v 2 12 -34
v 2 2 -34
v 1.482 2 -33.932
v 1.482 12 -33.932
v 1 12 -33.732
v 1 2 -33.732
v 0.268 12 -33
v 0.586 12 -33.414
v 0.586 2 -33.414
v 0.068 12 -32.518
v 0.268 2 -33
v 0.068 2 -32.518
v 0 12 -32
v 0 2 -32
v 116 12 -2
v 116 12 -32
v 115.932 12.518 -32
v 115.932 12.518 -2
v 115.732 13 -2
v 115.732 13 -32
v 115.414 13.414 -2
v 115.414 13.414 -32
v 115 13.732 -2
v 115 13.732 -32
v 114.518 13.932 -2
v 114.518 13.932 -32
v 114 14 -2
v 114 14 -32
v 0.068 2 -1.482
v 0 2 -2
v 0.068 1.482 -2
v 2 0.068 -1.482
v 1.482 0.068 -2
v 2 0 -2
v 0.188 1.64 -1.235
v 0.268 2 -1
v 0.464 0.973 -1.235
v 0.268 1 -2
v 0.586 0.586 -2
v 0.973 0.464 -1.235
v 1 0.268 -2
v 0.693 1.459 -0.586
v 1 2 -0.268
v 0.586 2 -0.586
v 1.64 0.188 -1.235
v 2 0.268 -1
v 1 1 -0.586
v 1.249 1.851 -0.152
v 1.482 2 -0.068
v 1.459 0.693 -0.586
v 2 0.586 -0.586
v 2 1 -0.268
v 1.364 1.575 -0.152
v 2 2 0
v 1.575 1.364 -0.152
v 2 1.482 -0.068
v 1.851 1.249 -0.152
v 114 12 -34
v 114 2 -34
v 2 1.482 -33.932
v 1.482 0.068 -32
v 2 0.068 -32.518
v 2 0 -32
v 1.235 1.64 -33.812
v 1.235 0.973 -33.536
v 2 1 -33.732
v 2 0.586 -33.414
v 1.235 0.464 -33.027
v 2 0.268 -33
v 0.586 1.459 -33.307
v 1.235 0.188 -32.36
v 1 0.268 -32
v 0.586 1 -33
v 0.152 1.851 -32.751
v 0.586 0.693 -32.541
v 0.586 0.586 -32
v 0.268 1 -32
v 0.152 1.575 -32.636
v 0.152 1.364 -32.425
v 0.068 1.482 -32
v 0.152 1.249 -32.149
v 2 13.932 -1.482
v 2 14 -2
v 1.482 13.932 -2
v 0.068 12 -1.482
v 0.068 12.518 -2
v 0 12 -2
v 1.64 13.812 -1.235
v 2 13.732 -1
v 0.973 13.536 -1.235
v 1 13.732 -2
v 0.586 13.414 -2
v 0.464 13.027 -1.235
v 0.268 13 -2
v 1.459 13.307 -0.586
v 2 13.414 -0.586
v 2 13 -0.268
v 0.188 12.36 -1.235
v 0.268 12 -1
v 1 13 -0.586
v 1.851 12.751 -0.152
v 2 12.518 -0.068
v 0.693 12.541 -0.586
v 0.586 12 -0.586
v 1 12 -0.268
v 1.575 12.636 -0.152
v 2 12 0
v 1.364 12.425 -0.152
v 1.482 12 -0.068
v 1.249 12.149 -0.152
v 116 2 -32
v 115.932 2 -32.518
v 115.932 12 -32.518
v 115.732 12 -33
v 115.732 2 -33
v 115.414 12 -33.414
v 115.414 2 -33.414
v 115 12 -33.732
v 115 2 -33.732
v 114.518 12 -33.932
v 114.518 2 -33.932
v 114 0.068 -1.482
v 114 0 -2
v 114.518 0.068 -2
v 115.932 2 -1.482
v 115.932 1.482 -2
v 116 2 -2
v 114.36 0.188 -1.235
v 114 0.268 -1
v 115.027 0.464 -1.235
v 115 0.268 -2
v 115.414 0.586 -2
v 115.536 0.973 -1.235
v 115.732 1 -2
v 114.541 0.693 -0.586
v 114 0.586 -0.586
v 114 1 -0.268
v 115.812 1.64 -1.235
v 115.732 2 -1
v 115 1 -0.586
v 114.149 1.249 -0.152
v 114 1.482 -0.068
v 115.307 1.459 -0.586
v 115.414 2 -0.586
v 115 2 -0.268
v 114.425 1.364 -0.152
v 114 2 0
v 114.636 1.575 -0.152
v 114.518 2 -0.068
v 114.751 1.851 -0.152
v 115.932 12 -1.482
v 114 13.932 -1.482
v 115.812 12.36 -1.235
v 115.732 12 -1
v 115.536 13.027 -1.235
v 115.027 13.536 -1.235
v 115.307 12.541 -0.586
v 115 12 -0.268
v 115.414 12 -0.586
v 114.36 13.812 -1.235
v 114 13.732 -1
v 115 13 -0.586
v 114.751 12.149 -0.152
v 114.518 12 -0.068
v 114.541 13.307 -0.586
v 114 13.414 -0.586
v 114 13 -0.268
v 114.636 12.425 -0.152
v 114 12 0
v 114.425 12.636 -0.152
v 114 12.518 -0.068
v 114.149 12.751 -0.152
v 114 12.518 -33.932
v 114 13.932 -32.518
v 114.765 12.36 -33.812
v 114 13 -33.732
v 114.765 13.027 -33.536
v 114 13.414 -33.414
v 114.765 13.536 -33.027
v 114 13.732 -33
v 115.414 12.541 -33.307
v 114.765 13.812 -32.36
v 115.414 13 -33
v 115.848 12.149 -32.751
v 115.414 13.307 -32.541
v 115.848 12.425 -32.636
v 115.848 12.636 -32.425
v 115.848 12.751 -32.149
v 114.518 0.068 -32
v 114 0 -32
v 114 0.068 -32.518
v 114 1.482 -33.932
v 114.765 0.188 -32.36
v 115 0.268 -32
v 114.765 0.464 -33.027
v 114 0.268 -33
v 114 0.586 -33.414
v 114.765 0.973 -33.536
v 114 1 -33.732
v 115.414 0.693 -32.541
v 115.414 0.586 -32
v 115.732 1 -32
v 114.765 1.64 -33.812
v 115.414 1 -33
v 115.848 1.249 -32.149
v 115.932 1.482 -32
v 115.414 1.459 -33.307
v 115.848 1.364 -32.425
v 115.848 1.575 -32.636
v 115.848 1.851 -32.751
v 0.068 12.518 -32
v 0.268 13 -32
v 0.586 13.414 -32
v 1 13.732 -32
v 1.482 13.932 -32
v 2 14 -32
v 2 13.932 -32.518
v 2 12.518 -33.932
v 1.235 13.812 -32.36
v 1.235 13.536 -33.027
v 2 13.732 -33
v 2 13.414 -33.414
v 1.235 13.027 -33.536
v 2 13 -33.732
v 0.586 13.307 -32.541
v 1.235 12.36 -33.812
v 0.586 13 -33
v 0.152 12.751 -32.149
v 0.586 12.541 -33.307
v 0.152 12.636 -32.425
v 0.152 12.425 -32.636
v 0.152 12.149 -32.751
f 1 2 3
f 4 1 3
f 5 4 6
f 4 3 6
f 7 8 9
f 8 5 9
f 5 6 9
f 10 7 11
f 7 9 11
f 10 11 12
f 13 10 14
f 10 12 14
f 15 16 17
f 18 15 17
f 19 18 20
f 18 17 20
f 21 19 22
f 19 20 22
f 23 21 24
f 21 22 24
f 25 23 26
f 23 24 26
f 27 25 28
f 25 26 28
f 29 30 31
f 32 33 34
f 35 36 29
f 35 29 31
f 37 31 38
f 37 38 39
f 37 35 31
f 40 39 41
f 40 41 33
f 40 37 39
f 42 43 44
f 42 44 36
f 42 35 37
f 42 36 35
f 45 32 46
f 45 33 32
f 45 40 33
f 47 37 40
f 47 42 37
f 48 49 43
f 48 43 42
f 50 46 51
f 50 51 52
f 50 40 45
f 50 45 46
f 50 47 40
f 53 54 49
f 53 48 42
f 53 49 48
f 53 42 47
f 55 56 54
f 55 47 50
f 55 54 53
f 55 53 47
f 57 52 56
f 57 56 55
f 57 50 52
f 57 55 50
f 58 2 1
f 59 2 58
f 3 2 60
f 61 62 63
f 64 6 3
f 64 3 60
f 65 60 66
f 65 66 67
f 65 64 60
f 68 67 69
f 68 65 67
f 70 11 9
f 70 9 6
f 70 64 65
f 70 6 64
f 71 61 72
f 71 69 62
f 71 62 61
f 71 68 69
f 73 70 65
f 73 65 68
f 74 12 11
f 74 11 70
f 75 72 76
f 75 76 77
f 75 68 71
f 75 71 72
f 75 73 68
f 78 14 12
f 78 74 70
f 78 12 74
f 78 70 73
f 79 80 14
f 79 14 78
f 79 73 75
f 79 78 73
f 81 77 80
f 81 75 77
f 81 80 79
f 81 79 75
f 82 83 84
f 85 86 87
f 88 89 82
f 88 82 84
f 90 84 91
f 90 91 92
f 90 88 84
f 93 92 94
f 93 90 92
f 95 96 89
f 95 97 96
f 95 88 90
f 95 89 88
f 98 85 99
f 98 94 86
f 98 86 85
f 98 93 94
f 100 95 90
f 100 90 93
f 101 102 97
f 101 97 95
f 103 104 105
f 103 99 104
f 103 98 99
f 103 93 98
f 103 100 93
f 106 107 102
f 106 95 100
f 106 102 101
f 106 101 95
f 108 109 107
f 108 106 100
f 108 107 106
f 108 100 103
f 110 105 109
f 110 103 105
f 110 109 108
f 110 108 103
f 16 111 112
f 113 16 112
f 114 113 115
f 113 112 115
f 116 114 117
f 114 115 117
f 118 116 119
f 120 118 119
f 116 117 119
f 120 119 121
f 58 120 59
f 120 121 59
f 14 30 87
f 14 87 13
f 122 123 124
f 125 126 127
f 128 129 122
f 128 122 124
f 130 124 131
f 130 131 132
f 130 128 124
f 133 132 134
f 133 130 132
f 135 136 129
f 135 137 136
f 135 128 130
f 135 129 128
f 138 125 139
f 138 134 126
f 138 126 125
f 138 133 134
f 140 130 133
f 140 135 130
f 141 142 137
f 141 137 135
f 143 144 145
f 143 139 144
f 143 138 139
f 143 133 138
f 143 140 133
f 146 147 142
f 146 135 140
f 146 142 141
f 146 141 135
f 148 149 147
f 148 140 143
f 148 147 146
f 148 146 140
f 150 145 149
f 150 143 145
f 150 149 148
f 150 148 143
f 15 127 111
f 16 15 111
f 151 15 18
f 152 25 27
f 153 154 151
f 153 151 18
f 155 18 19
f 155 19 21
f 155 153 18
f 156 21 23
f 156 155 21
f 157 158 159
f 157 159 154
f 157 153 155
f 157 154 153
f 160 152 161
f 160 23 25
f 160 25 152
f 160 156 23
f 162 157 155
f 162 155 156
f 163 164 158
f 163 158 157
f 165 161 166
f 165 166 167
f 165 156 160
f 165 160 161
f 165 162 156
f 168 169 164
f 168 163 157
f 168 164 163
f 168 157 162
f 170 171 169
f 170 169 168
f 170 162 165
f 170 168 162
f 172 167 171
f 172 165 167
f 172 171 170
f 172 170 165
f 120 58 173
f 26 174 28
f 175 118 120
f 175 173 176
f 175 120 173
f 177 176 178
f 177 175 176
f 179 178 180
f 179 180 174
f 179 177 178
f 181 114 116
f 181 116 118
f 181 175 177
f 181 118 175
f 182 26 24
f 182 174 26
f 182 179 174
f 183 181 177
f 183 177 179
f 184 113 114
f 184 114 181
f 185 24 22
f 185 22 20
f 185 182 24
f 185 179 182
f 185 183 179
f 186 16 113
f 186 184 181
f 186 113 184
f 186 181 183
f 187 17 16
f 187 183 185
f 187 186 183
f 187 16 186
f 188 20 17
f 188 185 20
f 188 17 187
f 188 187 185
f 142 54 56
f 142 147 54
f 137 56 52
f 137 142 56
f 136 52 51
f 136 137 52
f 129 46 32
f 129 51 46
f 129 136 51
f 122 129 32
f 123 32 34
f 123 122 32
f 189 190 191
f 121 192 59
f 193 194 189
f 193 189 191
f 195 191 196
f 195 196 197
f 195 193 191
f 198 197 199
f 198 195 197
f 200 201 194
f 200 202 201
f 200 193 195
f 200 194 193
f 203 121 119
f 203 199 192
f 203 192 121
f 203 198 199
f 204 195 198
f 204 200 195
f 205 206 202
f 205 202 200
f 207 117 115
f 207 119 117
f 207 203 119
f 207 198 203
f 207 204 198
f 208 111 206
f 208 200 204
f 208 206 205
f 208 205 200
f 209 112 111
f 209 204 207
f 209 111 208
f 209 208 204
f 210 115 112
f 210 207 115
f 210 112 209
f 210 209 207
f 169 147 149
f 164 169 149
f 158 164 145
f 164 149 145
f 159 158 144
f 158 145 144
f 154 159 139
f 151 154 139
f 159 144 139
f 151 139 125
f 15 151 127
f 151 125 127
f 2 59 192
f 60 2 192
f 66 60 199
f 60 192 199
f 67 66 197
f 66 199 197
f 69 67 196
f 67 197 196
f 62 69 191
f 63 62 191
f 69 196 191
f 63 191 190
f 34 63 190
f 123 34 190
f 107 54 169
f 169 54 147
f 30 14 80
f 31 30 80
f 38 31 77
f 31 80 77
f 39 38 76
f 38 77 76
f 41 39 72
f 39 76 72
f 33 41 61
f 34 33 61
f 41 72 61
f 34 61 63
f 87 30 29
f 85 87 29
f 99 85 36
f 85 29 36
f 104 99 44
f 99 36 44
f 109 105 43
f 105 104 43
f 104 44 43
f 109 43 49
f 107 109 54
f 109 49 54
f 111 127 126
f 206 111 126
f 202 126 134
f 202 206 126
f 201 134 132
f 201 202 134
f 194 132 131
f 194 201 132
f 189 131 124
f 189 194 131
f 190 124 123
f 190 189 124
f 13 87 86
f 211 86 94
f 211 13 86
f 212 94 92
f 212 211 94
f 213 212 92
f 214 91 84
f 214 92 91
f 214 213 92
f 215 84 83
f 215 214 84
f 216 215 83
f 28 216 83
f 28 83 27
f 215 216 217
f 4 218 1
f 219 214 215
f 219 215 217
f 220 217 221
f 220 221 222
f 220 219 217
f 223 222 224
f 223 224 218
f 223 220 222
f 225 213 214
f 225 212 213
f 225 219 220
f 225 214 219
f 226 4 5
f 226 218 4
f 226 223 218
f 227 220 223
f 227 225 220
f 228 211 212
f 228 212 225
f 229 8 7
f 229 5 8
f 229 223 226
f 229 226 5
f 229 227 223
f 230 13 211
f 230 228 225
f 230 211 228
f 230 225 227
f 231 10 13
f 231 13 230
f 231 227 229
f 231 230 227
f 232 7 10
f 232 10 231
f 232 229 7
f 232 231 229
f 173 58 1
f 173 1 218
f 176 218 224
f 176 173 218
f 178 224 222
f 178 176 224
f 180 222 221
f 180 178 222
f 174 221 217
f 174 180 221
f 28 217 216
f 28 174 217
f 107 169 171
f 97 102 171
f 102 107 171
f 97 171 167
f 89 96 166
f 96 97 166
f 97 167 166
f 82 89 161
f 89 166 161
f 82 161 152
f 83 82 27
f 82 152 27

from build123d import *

# Parameters (mm, degrees)
ESBO_O1_W                = 116
ESBO_O1_H                = 34
RESSALTO_EXTRUS_O1_DEPTH = 14
FILETE1_R                = 2
FILETE2_R                = 2


with BuildPart() as part:
    # Esboço1 → Ressalto-extrusão1 (new body)
    with BuildSketch(Plane(origin=(0, 0, 0), x_dir=(1, 0, 0), z_dir=(0, 1, 0))):
        with Locations((58, 17)):
            Rectangle(ESBO_O1_W, ESBO_O1_H)
    extrude(amount=RESSALTO_EXTRUS_O1_DEPTH)

    # Filete1
    filete1_edges = [part.edges().sort_by_distance(p)[0] for p in [
        (116, 14, -17),
        (58, 14, -34),
        (0, 14, -17),
        (58, 0, -34),
        (116, 0, -17),
        (58, 0, 0),
        (0, 0, -17),
        (58, 14, 0),
    ]]
    fillet(filete1_edges, radius=FILETE1_R)

    # Filete2
    # the kernel refuses this fillet: 2 mm, written as the material it takes off along each edge
    with BuildSketch(Plane(origin=(2, 2, -32), x_dir=(0, 0, -1), z_dir=(-1, 0, 0))) as filete2_piece_1_section:
        Polygon((0, 0), (FILETE2_R, 0), (FILETE2_R, FILETE2_R), (0, FILETE2_R), align=None)
    filete2_piece_1 = extrude(amount=FILETE2_R, mode=Mode.PRIVATE)
    filete2_piece_1 = filete2_piece_1 - Plane(origin=(2, 2, -32), x_dir=(0, 0.7071067811865475, 0.7071067811865475), z_dir=(-1, 0, 0)) * Sphere(FILETE2_R, mode=Mode.PRIVATE)
    add(filete2_piece_1, mode=Mode.SUBTRACT)
    with BuildSketch(Plane(origin=(114, 2, -32), x_dir=(0, 0, -1), z_dir=(1, 0, 0))) as filete2_piece_2_section:
        Polygon((0, 0), (FILETE2_R, 0), (FILETE2_R, -FILETE2_R), (0, -FILETE2_R), align=None)
    filete2_piece_2 = extrude(amount=FILETE2_R, mode=Mode.PRIVATE)
    filete2_piece_2 = filete2_piece_2 - Plane(origin=(114, 2, -32), x_dir=(0, 0.7071067811865475, 0.7071067811865475), z_dir=(1, 0, 0)) * Sphere(FILETE2_R, mode=Mode.PRIVATE)
    add(filete2_piece_2, mode=Mode.SUBTRACT)
    with BuildSketch(Plane(origin=(2, 2, -2), x_dir=(-1, 0, 0), z_dir=(0, 0, 1))) as filete2_piece_3_section:
        Polygon((0, 0), (FILETE2_R, 0), (FILETE2_R, FILETE2_R), (0, FILETE2_R), align=None)
    filete2_piece_3 = extrude(amount=FILETE2_R, mode=Mode.PRIVATE)
    filete2_piece_3 = filete2_piece_3 - Plane(origin=(2, 2, -2), x_dir=(0.7071067811865475, 0.7071067811865475, 0), z_dir=(0, 0, 1)) * Sphere(FILETE2_R, mode=Mode.PRIVATE)
    add(filete2_piece_3, mode=Mode.SUBTRACT)
    with BuildSketch(Plane(origin=(114, 2, -2), x_dir=(1, 0, 0), z_dir=(0, 0, 1))) as filete2_piece_4_section:
        Polygon((0, 0), (FILETE2_R, 0), (FILETE2_R, -FILETE2_R), (0, -FILETE2_R), align=None)
    filete2_piece_4 = extrude(amount=FILETE2_R, mode=Mode.PRIVATE)
    filete2_piece_4 = filete2_piece_4 - Plane(origin=(114, 2, -2), x_dir=(-0.7071067811865475, 0.7071067811865475, 2.06882771026568e-15), z_dir=(0, 0, 1)) * Sphere(FILETE2_R, mode=Mode.PRIVATE)
    add(filete2_piece_4, mode=Mode.SUBTRACT)
    with BuildSketch(Plane(origin=(114, 12, -2), x_dir=(1, 0, 0), z_dir=(0, 0, 1))) as filete2_piece_5_section:
        Polygon((0, 0), (FILETE2_R, 0), (FILETE2_R, FILETE2_R), (0, FILETE2_R), align=None)
    filete2_piece_5 = extrude(amount=FILETE2_R, mode=Mode.PRIVATE)
    filete2_piece_5 = filete2_piece_5 - Plane(origin=(114, 12, -2), x_dir=(-0.7071067811865475, -0.7071067811865475, 2.06882771026568e-15), z_dir=(0, 0, 1)) * Sphere(FILETE2_R, mode=Mode.PRIVATE)
    add(filete2_piece_5, mode=Mode.SUBTRACT)
    with BuildSketch(Plane(origin=(2, 12, -2), x_dir=(-1, 0, 0), z_dir=(0, 0, 1))) as filete2_piece_6_section:
        Polygon((0, 0), (FILETE2_R, 0), (FILETE2_R, -FILETE2_R), (0, -FILETE2_R), align=None)
    filete2_piece_6 = extrude(amount=FILETE2_R, mode=Mode.PRIVATE)
    filete2_piece_6 = filete2_piece_6 - Plane(origin=(2, 12, -2), x_dir=(0.7071067811865475, -0.7071067811865475, 0), z_dir=(0, 0, 1)) * Sphere(FILETE2_R, mode=Mode.PRIVATE)
    add(filete2_piece_6, mode=Mode.SUBTRACT)
    with BuildSketch(Plane(origin=(114, 12, -32), x_dir=(0, 0, -1), z_dir=(1, 0, 0))) as filete2_piece_7_section:
        Polygon((0, 0), (FILETE2_R, 0), (FILETE2_R, FILETE2_R), (0, FILETE2_R), align=None)
    filete2_piece_7 = extrude(amount=FILETE2_R, mode=Mode.PRIVATE)
    filete2_piece_7 = filete2_piece_7 - Plane(origin=(114, 12, -32), x_dir=(0, -0.7071067811865475, 0.7071067811865475), z_dir=(1, 0, 0)) * Sphere(FILETE2_R, mode=Mode.PRIVATE)
    add(filete2_piece_7, mode=Mode.SUBTRACT)
    with BuildSketch(Plane(origin=(2, 12, -32), x_dir=(0, 0, -1), z_dir=(-1, 0, 0))) as filete2_piece_8_section:
        Polygon((0, 0), (FILETE2_R, 0), (FILETE2_R, -FILETE2_R), (0, -FILETE2_R), align=None)
    filete2_piece_8 = extrude(amount=FILETE2_R, mode=Mode.PRIVATE)
    filete2_piece_8 = filete2_piece_8 - Plane(origin=(2, 12, -32), x_dir=(0, -0.7071067811865475, 0.7071067811865475), z_dir=(-1, 0, 0)) * Sphere(FILETE2_R, mode=Mode.PRIVATE)
    add(filete2_piece_8, mode=Mode.SUBTRACT)
    with BuildSketch(Plane(origin=(116, 2, 0), x_dir=(-1, 0, 0), z_dir=(0, 1, 0)), Plane(origin=(116, 2, -34), x_dir=(0, 0, 1), z_dir=(0, 1, 0))) as filete2_piece_9:
        with BuildLine():
            CenterArc((FILETE2_R, -FILETE2_R), FILETE2_R, 90, 90)
            Line((0, -FILETE2_R), (0, 0))
            Line((0, 0), (FILETE2_R, 0))
        make_face()
    extrude(amount=10, mode=Mode.SUBTRACT)
    with BuildSketch(Plane(origin=(0, 2, 0), x_dir=(1, 0, 0), z_dir=(0, 1, 0)), Plane(origin=(0, 2, -34), x_dir=(0, 0, 1), z_dir=(0, 1, 0))) as filete2_piece_10:
        with BuildLine():
            CenterArc((FILETE2_R, FILETE2_R), FILETE2_R, 180, 90)
            Line((0, FILETE2_R), (0, 0))
            Line((0, 0), (FILETE2_R, 0))
        make_face()
    extrude(amount=10, mode=Mode.SUBTRACT)


solid = part.part
